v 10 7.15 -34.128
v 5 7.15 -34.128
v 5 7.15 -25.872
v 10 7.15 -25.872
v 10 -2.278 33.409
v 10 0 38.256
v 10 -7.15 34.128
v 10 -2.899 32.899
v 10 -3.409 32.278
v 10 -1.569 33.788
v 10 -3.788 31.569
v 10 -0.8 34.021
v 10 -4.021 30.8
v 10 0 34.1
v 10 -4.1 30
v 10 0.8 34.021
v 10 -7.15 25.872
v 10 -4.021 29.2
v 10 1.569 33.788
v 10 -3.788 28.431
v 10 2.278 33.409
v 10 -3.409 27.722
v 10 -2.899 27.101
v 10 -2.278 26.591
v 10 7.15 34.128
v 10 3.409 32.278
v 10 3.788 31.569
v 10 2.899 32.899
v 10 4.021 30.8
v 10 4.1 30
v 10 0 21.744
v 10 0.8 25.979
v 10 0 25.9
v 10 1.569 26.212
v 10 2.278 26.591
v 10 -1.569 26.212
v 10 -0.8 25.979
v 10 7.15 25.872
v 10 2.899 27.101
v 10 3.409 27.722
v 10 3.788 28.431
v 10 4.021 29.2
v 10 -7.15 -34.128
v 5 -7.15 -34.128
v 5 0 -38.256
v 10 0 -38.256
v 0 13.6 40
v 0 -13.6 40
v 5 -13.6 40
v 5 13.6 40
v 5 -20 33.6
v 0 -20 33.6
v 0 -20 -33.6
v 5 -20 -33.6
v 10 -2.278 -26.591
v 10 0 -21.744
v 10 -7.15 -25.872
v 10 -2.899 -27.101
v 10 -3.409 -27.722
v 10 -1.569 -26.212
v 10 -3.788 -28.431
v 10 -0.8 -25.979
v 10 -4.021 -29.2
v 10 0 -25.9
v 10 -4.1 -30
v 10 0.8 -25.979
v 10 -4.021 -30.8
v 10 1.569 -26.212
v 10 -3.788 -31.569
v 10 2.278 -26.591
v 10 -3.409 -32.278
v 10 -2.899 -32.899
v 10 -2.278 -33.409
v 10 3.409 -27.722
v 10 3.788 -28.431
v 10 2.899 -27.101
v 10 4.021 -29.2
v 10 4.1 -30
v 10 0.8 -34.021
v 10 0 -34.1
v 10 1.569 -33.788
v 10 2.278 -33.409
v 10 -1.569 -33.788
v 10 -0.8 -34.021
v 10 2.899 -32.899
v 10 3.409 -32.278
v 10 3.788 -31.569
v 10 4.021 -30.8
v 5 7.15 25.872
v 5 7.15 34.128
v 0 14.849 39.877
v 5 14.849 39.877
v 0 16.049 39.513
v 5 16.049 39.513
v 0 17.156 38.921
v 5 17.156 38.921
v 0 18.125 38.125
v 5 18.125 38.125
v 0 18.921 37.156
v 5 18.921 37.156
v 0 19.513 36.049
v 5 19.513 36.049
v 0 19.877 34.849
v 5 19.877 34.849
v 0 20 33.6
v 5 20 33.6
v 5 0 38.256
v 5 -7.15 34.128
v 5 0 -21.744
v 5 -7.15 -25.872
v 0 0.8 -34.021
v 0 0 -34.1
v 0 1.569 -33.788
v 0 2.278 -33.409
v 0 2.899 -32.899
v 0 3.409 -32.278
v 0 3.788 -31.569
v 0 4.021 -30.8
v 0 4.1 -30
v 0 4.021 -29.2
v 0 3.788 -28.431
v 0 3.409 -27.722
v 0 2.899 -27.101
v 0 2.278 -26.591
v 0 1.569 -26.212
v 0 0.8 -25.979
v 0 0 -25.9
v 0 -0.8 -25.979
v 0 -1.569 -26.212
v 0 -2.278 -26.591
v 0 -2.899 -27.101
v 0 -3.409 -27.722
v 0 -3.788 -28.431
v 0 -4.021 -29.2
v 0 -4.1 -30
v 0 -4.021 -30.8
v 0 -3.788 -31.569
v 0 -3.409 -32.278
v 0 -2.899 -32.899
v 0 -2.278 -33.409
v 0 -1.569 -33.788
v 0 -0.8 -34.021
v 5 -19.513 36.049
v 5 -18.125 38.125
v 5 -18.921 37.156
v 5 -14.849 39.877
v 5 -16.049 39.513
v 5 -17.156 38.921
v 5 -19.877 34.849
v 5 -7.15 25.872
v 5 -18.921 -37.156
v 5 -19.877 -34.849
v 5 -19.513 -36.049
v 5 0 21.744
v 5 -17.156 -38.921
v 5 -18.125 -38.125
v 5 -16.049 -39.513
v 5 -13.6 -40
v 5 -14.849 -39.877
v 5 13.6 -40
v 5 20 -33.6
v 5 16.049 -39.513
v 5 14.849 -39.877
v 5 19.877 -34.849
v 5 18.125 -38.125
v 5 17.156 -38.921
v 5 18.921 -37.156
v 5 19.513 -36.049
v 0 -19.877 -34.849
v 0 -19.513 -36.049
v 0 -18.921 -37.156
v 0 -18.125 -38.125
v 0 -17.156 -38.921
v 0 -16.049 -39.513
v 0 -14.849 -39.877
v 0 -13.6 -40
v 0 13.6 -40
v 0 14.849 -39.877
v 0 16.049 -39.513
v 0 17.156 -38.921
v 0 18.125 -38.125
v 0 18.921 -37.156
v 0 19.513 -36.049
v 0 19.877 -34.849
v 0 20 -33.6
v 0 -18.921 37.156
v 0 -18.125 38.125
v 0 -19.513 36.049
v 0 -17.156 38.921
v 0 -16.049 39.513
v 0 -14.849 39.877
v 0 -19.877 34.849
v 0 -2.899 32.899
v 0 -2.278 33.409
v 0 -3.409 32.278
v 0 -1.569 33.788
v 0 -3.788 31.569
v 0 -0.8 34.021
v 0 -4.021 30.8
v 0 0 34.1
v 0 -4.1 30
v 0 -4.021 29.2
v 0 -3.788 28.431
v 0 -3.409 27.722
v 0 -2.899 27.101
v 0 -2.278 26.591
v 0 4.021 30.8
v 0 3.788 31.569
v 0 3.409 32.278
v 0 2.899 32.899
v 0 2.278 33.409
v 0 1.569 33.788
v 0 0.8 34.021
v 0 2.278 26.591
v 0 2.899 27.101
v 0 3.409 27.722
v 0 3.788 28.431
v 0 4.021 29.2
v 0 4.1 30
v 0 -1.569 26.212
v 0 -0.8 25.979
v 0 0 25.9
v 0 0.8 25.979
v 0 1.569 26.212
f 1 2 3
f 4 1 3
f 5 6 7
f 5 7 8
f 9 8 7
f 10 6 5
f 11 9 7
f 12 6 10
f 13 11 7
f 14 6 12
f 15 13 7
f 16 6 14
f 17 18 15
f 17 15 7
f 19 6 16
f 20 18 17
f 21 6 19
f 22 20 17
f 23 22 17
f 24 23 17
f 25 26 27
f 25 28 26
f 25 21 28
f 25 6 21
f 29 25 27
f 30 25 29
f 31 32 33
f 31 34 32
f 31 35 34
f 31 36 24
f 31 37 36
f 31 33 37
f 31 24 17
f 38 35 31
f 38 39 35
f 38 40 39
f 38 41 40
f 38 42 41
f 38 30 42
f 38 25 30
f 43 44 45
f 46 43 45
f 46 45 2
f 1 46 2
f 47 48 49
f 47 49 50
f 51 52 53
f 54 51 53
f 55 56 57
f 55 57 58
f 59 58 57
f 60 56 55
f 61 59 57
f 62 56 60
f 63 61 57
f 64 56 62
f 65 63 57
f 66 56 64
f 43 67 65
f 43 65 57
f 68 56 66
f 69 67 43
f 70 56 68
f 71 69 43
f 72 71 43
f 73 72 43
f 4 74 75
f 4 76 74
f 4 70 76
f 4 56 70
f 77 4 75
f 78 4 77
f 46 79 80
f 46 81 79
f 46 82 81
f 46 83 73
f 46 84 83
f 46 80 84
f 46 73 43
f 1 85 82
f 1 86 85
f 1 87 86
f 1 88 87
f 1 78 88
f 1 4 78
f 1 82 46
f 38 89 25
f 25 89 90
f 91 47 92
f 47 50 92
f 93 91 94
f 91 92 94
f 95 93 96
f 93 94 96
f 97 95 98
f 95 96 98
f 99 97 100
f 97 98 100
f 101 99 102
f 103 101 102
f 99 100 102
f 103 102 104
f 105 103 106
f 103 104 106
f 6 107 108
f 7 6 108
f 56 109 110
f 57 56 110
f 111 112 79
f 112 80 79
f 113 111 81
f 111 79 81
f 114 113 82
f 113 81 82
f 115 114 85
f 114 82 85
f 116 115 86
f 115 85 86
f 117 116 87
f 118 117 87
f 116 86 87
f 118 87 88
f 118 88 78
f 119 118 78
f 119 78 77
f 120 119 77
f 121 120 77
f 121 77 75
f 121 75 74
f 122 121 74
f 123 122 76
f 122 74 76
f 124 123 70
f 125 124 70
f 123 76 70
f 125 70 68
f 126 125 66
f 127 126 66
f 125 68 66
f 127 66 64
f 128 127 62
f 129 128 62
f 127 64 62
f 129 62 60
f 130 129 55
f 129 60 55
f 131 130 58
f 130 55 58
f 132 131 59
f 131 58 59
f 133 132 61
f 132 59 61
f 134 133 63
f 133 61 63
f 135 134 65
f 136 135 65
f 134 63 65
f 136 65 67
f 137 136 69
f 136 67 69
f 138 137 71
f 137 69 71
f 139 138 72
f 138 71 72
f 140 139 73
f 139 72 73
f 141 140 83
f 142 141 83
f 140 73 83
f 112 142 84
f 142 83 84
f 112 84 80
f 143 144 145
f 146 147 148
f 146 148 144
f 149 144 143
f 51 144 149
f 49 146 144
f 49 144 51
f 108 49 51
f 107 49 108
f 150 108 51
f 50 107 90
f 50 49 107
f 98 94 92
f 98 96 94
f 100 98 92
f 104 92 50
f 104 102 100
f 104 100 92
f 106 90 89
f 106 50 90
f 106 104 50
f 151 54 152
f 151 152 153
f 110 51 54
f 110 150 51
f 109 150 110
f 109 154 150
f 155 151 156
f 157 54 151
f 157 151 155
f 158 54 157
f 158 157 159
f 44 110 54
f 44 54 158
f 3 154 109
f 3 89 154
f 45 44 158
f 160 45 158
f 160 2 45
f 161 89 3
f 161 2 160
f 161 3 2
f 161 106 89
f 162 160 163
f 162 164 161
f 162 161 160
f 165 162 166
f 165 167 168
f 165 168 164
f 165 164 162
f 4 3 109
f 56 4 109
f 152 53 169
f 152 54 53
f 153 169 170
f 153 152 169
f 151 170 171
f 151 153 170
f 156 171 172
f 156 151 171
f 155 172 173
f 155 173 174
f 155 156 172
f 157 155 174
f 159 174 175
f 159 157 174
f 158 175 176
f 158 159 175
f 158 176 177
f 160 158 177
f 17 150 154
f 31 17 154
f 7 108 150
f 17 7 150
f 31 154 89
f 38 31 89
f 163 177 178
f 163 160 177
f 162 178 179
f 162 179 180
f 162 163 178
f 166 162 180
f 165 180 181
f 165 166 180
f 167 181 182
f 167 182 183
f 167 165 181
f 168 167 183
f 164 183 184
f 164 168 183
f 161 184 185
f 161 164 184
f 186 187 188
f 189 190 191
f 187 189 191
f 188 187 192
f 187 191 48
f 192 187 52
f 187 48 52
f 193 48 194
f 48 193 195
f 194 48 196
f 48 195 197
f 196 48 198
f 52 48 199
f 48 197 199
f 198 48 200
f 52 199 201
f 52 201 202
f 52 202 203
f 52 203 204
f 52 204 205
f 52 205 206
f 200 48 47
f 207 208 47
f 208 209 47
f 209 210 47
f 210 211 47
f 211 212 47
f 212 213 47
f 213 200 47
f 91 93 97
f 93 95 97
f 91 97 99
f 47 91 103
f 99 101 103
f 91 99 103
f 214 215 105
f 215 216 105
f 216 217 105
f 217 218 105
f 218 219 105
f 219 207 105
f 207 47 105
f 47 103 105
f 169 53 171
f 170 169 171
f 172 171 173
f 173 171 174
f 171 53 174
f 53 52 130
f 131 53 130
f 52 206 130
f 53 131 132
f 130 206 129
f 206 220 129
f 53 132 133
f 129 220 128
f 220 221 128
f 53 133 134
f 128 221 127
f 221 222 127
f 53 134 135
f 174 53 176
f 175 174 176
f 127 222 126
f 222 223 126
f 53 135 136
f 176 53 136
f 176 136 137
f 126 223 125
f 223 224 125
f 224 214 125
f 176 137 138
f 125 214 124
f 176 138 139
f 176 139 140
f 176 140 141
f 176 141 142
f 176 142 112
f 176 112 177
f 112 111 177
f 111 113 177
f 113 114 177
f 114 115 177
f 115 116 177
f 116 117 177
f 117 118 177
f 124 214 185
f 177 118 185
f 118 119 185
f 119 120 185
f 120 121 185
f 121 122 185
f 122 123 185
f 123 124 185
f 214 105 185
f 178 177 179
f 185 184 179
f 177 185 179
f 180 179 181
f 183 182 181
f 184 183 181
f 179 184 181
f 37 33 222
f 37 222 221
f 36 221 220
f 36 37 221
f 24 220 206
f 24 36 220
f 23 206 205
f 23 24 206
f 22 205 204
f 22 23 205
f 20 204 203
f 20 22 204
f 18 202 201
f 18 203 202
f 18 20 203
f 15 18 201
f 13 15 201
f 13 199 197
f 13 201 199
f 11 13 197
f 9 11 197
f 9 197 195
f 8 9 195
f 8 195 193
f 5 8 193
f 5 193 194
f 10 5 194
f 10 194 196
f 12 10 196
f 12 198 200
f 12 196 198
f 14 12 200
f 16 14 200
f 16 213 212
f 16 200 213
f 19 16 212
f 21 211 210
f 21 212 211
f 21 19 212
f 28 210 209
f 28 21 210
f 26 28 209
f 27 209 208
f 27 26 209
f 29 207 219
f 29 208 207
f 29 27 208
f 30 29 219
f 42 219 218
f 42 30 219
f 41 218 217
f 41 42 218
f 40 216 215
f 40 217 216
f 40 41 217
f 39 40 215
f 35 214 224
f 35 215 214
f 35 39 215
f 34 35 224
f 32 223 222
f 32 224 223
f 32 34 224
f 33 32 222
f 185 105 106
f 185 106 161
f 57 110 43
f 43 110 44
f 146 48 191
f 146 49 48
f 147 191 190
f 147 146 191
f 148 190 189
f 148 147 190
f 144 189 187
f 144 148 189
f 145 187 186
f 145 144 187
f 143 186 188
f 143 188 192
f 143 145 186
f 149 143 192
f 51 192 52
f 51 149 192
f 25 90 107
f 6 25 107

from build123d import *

# Parameters (mm, degrees)
SZKIC2_W                    = 80
SZKIC2_H                    = 40
DODANIE_WYCI_GNI_CIE1_DEPTH = 5
ZAOKR_GLENIE1_R             = 6.4
SZKIC3_R                    = 4.1
WYTNIJ_WYCI_GNI_CIE1_DEPTH  = 10
DODANIE_WYCI_GNI_CIE2_DEPTH = 5
WYTNIJ_WYCI_GNI_CIE2_START  = -15
SZKIC5_R                    = 4.1
WYTNIJ_WYCI_GNI_CIE2_DEPTH  = 15


with BuildPart() as part:
    # Szkic2 → Dodanie-wyciągnięcie1 (new body)
    with BuildSketch(Plane(origin=(0, 0, 0), x_dir=(0, 0, -1), z_dir=(1, 0, 0))):
        Rectangle(SZKIC2_W, SZKIC2_H)
    extrude(amount=DODANIE_WYCI_GNI_CIE1_DEPTH)

    # Zaokrąglenie1
    zaokr_glenie1_edges = [part.edges().sort_by_distance(p)[0] for p in [
        (2.5, -20, -40),
        (2.5, -20, 40),
        (2.5, 20, 40),
        (2.5, 20, -40),
    ]]
    fillet(zaokr_glenie1_edges, radius=ZAOKR_GLENIE1_R)

    # Szkic3 → Wytnij-wyciągnięcie1 (cut, symmetric)
    with BuildSketch(Plane(origin=(5, 0, 0), x_dir=(0, 0, -1), z_dir=(1, 0, 0))):
        with Locations((-30, 0)):
            Circle(SZKIC3_R)
        with Locations((30, 0)):
            Circle(SZKIC3_R)
    extrude(amount=WYTNIJ_WYCI_GNI_CIE1_DEPTH, both=True, mode=Mode.SUBTRACT)

    # Szkic4 → Dodanie-wyciągnięcie2 (add)
    with BuildSketch(Plane(origin=(5, 0, 0), x_dir=(0, 0, -1), z_dir=(1, 0, 0))):
        Polygon((-21.743891151, 0), (-25.871945575, 7.15), (-34.128054425, 7.15), (-38.256108849, 0), (-34.128054425, -7.15), (-25.871945575, -7.15), align=None)
        Polygon((21.743891151, 0), (25.871945575, -7.15), (34.128054425, -7.15), (38.256108849, 0), (34.128054425, 7.15), (25.871945575, 7.15), align=None)
    extrude(amount=DODANIE_WYCI_GNI_CIE2_DEPTH)

    # Szkic5 → Wytnij-wyciągnięcie2 (cut)
    with BuildSketch(Plane.ZY.offset(WYTNIJ_WYCI_GNI_CIE2_START)):
        with Locations(Location((30, 0, 0), (0, 0, 180))):
            Circle(SZKIC5_R)
        with Locations(Location((-30, 0, 0), (0, 0, 180))):
            Circle(SZKIC5_R)
    extrude(amount=WYTNIJ_WYCI_GNI_CIE2_DEPTH, mode=Mode.SUBTRACT)


solid = part.part
